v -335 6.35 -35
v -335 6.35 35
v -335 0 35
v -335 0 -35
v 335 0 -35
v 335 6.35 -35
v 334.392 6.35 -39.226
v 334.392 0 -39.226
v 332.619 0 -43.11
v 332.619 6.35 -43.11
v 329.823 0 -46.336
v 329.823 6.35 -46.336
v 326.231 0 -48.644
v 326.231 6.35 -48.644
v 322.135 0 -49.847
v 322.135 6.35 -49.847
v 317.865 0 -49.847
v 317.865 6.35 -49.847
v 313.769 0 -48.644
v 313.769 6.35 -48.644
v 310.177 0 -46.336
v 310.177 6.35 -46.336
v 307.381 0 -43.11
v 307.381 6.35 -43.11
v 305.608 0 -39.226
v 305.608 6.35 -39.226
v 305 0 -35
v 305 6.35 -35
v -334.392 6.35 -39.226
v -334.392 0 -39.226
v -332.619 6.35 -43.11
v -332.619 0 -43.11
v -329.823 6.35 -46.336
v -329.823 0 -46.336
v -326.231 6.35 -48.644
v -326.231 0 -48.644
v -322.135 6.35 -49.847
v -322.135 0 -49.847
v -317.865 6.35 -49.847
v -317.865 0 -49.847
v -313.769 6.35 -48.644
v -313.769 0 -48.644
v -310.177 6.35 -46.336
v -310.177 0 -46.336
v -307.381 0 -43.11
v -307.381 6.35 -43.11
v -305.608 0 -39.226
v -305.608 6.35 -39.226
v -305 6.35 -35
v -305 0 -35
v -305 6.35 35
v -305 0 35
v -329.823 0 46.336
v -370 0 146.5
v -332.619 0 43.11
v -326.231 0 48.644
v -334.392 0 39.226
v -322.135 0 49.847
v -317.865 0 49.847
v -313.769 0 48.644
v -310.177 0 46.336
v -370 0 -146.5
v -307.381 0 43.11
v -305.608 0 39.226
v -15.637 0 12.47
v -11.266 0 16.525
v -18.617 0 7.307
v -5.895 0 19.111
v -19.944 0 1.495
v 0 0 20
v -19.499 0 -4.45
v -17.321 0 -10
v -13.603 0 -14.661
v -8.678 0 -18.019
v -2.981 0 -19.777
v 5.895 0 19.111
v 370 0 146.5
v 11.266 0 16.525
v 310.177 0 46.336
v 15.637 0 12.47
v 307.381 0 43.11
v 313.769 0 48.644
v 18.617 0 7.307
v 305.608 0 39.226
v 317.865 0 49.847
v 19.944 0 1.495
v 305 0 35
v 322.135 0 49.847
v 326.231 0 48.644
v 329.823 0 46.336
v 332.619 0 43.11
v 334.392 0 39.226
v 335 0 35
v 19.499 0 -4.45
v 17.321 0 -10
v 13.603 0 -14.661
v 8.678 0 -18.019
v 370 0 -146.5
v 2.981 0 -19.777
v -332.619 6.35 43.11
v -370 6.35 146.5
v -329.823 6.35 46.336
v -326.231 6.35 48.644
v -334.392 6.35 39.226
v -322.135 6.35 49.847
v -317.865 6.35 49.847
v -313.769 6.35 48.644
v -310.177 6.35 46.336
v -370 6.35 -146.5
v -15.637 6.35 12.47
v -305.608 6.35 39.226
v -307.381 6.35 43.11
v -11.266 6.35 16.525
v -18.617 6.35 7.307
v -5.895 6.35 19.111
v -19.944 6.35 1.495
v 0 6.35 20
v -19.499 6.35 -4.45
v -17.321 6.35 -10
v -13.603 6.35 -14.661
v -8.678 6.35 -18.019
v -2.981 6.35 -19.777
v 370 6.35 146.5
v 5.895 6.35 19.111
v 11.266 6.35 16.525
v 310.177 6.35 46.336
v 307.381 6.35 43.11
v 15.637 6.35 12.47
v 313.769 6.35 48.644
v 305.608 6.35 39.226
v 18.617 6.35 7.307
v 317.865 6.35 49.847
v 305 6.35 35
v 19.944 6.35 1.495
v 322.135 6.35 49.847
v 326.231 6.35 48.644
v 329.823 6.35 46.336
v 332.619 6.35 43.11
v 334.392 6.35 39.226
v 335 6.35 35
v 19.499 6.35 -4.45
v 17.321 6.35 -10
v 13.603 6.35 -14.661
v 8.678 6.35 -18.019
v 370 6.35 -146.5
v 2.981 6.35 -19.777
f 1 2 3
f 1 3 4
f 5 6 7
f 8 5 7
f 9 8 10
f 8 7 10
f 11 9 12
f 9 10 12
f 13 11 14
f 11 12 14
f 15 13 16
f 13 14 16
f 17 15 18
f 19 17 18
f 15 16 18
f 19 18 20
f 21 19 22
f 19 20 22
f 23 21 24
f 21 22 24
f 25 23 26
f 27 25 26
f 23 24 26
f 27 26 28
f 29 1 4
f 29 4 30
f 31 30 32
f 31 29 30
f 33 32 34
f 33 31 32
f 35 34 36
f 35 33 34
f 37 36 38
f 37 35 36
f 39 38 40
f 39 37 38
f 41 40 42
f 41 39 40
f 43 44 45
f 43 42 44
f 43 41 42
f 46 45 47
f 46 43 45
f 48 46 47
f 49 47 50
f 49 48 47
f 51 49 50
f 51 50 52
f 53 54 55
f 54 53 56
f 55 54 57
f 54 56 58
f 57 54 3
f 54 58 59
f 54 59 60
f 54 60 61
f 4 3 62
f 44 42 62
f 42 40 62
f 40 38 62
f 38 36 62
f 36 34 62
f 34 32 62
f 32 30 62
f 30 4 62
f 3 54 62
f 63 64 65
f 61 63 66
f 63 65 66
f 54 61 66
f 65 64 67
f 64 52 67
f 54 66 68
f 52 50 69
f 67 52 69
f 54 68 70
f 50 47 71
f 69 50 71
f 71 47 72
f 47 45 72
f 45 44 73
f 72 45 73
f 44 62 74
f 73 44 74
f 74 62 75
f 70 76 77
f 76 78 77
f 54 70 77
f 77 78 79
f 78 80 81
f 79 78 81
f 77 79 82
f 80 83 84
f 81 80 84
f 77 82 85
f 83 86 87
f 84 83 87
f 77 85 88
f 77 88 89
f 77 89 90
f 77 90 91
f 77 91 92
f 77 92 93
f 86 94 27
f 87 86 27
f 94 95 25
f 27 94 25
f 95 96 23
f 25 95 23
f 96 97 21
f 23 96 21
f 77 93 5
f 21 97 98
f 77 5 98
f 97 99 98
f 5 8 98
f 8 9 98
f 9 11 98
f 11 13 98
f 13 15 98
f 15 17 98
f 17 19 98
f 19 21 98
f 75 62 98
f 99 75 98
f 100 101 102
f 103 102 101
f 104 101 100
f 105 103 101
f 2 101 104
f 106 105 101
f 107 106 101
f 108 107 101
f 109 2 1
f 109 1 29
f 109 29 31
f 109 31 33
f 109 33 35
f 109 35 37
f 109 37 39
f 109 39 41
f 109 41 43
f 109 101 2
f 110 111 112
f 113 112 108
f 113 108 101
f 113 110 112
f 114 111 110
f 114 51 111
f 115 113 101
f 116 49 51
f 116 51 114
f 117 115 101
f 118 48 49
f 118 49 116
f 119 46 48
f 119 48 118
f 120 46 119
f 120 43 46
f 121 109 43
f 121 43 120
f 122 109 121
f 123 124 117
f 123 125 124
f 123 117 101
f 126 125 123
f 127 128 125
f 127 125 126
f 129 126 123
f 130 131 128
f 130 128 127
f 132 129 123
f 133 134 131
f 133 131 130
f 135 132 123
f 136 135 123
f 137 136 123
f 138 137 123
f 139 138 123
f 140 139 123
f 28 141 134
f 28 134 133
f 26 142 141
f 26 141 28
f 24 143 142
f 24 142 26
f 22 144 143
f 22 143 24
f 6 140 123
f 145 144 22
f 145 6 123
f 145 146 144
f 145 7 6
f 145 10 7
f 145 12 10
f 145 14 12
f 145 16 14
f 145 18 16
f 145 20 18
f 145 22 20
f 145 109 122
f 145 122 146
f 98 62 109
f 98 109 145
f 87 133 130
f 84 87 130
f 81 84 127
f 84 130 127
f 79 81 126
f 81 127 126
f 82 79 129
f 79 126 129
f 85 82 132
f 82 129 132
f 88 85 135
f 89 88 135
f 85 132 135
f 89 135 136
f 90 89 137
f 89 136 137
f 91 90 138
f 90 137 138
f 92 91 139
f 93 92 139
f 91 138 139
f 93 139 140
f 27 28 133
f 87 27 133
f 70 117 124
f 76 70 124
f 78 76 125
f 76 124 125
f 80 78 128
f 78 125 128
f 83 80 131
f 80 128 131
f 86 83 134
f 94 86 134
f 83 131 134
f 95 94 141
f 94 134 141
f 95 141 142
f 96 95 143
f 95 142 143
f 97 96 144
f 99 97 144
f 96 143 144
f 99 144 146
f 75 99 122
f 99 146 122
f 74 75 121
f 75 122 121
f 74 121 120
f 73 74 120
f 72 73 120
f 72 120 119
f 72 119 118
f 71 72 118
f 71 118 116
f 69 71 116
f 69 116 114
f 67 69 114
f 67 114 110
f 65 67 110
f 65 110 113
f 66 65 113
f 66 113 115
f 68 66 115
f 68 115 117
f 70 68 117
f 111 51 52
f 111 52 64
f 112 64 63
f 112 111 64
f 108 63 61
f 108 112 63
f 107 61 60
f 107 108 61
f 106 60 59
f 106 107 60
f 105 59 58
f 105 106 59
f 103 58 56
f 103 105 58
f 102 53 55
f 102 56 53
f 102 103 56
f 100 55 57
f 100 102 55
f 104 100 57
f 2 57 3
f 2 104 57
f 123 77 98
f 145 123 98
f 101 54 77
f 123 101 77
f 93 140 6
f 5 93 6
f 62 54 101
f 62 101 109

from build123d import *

# Parameters (mm, degrees)
SKETCH1_W         = 740
SKETCH1_H         = 293
BASE_DEPTH        = 6.35
HANDLES_DEPTH     = 398.998206654
SKETCH3_R         = 20
CAMERA_HOLE_DEPTH = 398.998206654


with BuildPart() as part:
    # Sketch1 → Base (new body)
    with BuildSketch(Plane(origin=(0, 0, 0), x_dir=(1, 0, 0), z_dir=(0, 1, 0))):
        Rectangle(SKETCH1_W, SKETCH1_H)
    extrude(amount=BASE_DEPTH)

    # Sketch2 → Handles (cut, through all)
    with BuildSketch(Plane(origin=(0, 6.35, 0), x_dir=(1, 0, 0), z_dir=(0, 1, 0))):
        with BuildLine():
            Line((-335, -35), (-335, 35))
            ThreePointArc((-335, 35), (-320, 50), (-305, 35))
            Line((-305, 35), (-305, -35))
            ThreePointArc((-305, -35), (-320, -50), (-335, -35))
        make_face()
        with BuildLine():
            Line((335, -35), (335, 35))
            ThreePointArc((335, 35), (320, 50), (305, 35))
            Line((305, 35), (305, -35))
            ThreePointArc((305, -35), (320, -50), (335, -35))
        make_face()
    extrude(amount=-HANDLES_DEPTH, mode=Mode.SUBTRACT)

    # Sketch3 → Camera Hole (cut, through all)
    with BuildSketch(Plane(origin=(0, 6.35, 0), x_dir=(1, 0, 0), z_dir=(0, 1, 0))):
        with Locations(Location((0, 0, 0), (0, 0, 270))):
            Circle(SKETCH3_R)
    extrude(amount=-CAMERA_HOLE_DEPTH, mode=Mode.SUBTRACT)


solid = part.part
